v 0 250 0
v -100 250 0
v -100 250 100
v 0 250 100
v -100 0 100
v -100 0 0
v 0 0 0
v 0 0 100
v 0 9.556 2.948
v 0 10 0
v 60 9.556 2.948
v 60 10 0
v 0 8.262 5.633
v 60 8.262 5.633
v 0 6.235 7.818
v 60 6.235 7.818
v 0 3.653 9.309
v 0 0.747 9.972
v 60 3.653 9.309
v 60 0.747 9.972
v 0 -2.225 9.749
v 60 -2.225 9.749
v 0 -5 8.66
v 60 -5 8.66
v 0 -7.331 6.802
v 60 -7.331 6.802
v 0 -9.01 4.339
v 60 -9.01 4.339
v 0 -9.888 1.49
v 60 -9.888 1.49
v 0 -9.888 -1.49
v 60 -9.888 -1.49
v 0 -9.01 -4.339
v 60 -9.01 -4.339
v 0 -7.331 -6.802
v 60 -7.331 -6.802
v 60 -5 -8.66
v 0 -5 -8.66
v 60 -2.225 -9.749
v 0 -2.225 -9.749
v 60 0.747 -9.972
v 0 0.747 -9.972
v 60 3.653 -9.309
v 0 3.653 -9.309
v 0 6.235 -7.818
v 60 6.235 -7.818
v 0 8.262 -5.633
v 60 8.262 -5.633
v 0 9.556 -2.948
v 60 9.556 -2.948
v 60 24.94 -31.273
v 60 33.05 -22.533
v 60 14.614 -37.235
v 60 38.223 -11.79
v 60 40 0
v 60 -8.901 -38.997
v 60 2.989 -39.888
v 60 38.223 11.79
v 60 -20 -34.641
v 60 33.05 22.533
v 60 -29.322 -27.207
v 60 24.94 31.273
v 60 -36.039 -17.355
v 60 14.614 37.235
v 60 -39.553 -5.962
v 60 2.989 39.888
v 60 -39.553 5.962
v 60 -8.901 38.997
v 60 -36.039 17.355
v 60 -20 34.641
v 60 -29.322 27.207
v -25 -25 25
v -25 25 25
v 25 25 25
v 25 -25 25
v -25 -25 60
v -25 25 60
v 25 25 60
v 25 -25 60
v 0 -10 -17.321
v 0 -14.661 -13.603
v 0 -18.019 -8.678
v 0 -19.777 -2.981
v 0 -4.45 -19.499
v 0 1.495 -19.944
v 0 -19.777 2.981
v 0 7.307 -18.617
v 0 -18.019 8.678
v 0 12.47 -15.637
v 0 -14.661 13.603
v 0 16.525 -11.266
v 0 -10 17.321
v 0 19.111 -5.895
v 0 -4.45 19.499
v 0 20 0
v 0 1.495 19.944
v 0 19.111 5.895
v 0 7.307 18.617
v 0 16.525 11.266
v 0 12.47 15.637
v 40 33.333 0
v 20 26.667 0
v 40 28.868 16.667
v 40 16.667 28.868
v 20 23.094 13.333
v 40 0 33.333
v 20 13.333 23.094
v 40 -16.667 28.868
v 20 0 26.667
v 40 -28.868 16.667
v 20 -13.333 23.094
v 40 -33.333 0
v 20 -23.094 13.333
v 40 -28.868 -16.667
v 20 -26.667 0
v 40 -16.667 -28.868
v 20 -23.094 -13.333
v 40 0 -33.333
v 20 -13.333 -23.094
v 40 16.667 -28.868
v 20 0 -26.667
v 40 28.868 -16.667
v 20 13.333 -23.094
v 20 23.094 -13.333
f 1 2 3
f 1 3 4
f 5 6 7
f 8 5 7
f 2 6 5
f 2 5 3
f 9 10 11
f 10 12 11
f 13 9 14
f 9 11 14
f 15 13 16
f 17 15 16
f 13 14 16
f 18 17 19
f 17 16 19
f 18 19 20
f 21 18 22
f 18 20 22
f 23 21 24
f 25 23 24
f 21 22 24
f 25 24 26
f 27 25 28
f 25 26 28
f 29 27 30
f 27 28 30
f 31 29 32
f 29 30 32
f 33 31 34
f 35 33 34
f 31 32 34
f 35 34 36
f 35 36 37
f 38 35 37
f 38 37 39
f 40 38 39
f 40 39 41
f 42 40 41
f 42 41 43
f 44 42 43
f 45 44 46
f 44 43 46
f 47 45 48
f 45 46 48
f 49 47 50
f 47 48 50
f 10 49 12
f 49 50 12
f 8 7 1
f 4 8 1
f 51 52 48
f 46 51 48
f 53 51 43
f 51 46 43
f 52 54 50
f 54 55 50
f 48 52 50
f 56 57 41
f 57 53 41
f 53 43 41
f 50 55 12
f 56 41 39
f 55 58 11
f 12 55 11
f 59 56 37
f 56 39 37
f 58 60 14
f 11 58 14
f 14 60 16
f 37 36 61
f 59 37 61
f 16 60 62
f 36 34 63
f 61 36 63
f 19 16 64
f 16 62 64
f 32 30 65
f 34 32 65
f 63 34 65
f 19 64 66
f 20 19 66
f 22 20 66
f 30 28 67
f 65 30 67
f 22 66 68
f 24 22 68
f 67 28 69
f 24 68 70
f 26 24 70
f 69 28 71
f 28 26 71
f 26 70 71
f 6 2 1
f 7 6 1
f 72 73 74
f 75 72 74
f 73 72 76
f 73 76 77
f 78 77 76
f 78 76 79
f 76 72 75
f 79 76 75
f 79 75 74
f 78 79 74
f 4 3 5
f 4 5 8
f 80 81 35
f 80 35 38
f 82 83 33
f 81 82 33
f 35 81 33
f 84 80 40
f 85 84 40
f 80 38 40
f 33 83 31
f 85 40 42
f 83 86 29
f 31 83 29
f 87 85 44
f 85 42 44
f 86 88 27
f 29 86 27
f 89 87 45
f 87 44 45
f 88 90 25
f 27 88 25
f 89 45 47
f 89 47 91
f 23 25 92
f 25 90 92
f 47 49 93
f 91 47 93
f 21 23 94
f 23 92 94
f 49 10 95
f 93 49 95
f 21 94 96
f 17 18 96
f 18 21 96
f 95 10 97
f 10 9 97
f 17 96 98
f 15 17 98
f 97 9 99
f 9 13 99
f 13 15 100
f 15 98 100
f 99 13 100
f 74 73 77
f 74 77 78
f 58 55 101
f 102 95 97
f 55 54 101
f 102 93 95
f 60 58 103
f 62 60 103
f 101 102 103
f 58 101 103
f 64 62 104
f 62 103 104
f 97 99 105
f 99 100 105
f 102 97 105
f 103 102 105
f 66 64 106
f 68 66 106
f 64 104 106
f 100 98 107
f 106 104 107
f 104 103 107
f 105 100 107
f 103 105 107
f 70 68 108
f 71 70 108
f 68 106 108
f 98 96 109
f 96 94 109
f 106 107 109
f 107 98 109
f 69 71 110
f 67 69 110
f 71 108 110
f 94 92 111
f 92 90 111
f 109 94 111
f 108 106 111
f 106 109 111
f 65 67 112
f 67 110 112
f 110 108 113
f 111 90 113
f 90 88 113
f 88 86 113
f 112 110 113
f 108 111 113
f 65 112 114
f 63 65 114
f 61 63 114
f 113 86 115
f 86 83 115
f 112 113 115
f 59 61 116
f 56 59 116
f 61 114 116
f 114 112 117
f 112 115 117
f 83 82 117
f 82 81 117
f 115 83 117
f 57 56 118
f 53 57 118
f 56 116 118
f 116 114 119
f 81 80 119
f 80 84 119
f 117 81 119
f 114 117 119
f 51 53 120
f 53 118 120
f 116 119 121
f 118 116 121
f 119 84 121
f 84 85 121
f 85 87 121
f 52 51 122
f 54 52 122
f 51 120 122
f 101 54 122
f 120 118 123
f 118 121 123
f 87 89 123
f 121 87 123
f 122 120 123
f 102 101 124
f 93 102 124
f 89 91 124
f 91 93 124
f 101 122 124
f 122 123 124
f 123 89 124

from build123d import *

# Parameters (mm, degrees)
F0_W     = 100
F0_H     = 250
F1_DEPTH = 100
F5_START = 25
F4_W     = 50
F4_H     = 50
F5_DEPTH = 35


with BuildPart() as f1:
    # F0 (on Top) → F1 (new body)
    with BuildSketch(Plane.XY):
        with Locations((-50, 125)):
            Rectangle(F0_W, F0_H)
    extrude(amount=F1_DEPTH)


with BuildPart() as f3:
    # F2 (on Top) → F3 (revolve)
    with BuildSketch(Plane.XY):
        Polygon((60, 40), (0, 20), (0, 10), (60, 10), align=None)
    revolve(axis=Axis((11.9034722447, 0, 0), (1, 0, 0)))


with BuildPart() as f5:
    # F4 (on Top) → F5 (new body)
    with BuildSketch(Plane.XY.offset(F5_START)):
        Rectangle(F4_W, F4_H)
    extrude(amount=F5_DEPTH)


solid = Compound([f1.part, f3.part, f5.part])
